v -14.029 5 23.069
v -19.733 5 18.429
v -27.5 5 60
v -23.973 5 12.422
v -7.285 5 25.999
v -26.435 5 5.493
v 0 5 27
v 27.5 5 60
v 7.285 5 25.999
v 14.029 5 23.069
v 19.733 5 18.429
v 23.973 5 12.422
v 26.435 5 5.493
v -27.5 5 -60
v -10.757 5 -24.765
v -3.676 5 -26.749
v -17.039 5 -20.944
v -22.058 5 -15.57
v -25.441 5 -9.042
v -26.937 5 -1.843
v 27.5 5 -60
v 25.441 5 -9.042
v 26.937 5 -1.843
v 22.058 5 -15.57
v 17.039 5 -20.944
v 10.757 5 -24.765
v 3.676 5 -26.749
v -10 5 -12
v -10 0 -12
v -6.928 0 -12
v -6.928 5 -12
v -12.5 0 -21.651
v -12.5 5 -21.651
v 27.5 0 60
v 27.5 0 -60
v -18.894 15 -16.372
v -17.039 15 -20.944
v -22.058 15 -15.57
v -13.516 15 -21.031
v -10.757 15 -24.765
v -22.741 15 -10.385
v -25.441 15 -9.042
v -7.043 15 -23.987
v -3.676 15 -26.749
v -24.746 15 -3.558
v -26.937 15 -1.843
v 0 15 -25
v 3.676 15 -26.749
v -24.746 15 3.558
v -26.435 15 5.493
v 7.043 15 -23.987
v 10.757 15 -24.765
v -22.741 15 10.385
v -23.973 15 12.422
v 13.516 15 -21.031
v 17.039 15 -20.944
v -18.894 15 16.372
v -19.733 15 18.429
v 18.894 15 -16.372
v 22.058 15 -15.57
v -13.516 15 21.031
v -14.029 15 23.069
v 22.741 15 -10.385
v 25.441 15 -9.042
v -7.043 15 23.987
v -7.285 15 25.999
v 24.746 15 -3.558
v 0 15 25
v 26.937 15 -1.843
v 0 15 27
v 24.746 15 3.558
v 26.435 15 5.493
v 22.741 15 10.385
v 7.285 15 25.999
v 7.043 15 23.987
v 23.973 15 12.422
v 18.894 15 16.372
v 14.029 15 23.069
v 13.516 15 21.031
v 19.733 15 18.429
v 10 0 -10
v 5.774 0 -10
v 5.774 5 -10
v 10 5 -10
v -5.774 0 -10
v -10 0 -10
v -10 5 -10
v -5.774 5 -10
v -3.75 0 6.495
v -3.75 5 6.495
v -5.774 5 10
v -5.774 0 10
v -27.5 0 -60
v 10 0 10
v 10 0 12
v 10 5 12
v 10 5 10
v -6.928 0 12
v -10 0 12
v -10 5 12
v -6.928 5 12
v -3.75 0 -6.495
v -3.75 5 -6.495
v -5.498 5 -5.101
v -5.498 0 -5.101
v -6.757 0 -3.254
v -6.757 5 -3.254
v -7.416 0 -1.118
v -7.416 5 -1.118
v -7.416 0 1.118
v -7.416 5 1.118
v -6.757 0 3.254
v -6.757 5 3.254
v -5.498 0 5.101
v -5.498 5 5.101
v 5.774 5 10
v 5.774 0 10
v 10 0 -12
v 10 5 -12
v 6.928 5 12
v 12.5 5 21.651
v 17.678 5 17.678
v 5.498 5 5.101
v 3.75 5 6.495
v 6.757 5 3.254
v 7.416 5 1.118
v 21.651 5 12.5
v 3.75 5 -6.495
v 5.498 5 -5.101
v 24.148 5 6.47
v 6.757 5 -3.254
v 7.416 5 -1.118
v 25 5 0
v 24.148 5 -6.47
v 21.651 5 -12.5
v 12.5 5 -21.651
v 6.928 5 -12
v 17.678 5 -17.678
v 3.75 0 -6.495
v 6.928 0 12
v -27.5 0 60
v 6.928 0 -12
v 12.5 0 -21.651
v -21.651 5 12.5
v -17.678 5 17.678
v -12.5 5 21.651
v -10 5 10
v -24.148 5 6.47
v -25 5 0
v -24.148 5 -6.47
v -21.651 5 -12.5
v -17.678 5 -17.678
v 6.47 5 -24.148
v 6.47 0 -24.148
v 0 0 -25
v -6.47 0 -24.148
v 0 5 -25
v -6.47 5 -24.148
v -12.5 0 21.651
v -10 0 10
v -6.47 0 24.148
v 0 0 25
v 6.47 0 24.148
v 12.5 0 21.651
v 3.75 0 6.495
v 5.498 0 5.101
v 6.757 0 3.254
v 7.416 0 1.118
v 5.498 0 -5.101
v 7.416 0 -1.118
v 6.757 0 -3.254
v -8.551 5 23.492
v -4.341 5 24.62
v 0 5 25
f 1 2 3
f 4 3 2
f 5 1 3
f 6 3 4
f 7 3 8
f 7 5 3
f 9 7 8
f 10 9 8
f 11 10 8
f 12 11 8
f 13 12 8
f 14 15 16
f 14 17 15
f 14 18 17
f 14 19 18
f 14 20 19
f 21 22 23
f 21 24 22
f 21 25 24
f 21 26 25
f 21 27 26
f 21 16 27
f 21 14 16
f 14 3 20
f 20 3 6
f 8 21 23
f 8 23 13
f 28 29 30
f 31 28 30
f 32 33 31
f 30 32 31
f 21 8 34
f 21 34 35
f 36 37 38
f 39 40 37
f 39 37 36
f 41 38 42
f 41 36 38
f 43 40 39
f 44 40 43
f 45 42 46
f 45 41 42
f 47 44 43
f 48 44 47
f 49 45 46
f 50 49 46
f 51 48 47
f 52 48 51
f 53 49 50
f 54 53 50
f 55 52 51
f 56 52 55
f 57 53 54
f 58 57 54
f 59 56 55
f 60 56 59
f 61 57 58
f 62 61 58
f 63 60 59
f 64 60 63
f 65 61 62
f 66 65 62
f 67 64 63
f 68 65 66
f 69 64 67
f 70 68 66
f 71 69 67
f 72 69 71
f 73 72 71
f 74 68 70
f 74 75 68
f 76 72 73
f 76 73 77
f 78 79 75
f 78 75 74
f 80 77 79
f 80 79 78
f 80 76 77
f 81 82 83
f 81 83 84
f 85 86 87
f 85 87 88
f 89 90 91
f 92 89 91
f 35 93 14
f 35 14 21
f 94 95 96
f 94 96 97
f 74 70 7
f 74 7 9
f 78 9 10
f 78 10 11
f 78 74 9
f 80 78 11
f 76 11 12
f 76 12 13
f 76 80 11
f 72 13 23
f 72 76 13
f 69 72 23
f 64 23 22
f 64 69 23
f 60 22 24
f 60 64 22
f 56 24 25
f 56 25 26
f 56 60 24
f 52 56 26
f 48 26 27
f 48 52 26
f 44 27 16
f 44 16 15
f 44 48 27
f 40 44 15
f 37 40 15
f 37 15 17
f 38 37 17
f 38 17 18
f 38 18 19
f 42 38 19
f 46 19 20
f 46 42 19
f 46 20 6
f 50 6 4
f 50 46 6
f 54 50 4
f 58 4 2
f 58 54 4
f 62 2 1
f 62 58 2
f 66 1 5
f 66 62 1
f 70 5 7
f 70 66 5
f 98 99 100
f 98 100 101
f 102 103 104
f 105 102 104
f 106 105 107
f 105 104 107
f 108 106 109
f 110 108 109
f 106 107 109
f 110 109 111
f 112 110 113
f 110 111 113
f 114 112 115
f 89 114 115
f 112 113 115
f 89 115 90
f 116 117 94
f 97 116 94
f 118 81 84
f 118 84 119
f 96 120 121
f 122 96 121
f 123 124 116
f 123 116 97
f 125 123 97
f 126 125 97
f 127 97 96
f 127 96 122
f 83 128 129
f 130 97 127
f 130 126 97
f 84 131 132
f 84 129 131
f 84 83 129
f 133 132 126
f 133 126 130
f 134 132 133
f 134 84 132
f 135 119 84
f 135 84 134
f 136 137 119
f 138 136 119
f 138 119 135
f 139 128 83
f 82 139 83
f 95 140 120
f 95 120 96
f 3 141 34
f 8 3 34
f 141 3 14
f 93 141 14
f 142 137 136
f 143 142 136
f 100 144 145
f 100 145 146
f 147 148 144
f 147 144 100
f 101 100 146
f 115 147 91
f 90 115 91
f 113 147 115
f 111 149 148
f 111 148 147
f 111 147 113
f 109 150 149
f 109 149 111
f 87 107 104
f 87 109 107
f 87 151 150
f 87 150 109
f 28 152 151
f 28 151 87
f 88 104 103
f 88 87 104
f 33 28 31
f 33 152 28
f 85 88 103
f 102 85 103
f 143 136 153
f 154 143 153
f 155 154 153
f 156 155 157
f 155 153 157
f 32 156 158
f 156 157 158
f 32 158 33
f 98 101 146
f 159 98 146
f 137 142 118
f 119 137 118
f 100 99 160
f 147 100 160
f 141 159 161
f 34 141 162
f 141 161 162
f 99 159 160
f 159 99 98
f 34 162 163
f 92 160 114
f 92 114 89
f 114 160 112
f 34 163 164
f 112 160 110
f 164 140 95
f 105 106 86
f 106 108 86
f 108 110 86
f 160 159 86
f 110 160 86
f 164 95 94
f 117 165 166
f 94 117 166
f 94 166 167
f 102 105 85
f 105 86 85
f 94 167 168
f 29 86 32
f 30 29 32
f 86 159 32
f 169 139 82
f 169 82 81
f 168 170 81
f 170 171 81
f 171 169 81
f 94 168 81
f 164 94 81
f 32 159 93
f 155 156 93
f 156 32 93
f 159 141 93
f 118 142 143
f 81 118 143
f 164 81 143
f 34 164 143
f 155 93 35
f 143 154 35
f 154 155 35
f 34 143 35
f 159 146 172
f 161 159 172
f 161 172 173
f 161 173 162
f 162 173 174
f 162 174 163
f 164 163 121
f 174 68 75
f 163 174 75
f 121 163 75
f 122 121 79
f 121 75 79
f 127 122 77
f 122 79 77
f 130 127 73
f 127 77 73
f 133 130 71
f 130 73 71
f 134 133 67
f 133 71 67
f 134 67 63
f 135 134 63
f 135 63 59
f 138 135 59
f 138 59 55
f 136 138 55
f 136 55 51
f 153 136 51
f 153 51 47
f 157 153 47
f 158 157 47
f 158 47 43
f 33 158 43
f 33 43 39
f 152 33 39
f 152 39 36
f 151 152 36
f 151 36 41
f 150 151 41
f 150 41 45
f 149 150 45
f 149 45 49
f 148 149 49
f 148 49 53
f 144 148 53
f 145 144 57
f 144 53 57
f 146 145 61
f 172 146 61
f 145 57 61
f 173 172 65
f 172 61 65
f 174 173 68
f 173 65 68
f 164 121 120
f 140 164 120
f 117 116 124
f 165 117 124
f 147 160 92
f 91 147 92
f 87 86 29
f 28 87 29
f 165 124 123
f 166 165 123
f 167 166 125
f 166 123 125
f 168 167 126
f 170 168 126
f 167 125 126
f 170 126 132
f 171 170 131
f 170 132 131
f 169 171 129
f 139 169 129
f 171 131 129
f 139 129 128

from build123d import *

# Parameters (mm, degrees)
SKETCH1_W           = 102
SKETCH1_H           = 120
SKETCH1_W_2         = 20
SKETCH1_H_2         = 2
BOSS_EXTRUDE1_DEPTH = 5
CUT_EXTRUDE12_DEPTH = 10
BOSS_EXTRUDE3_START = 10
SKETCH5_R           = 27
SKETCH5_R_2         = 25
BOSS_EXTRUDE3_DEPTH = 10
SKETCH6_W           = 23.5
SKETCH6_H           = 120
CUT_EXTRUDE15_DEPTH = 10


with BuildPart() as part:
    # Sketch1 → Boss-Extrude1 (new body)
    with BuildSketch(Plane(origin=(0, 0, 0), x_dir=(1, 0, 0), z_dir=(0, 1, 0))):
        Rectangle(SKETCH1_W, SKETCH1_H)
        with Locations((0, -11)):
            Rectangle(SKETCH1_W_2, SKETCH1_H_2, mode=Mode.SUBTRACT)
        with Locations((0, 11)):
            Rectangle(SKETCH1_W_2, SKETCH1_H_2, mode=Mode.SUBTRACT)
    extrude(amount=BOSS_EXTRUDE1_DEPTH)

    # Sketch2 → Cut-Extrude12 (cut)
    with BuildSketch(Plane(origin=(0, 5, 0), x_dir=(1, 0, 0), z_dir=(0, 1, 0))):
        with BuildLine():
            Line((3.75, 6.495190528), (12.5, 21.650635095))
            ThreePointArc((12.5, 21.650635095), (0, 25), (-12.5, 21.650635095))
            Line((-12.5, 21.650635095), (-3.75, 6.495190528))
            ThreePointArc((-3.75, 6.495190528), (-7.5, 0), (-3.75, -6.495190528))
            Line((-3.75, -6.495190528), (-12.5, -21.650635095))
            ThreePointArc((-12.5, -21.650635095), (0, -25), (12.5, -21.650635095))
            Line((12.5, -21.650635095), (3.75, -6.495190528))
            ThreePointArc((3.75, -6.495190528), (7.5, 0), (3.75, 6.495190528))
        make_face()
    extrude(amount=-CUT_EXTRUDE12_DEPTH, mode=Mode.SUBTRACT)

    # Sketch5 → Boss-Extrude3 (add)
    with BuildSketch(Plane(origin=(0, 5, 0), x_dir=(1, 0, 0), z_dir=(0, 1, 0)).offset(BOSS_EXTRUDE3_START)):
        with Locations(Location((0, 0, 0), (0, 0, 270))):
            Circle(SKETCH5_R)
        with Locations(Location((0, 0, 0), (0, 0, 270))):
            Circle(SKETCH5_R_2, mode=Mode.SUBTRACT)
    extrude(amount=-BOSS_EXTRUDE3_DEPTH)

    # Sketch6 → Cut-Extrude15 (cut)
    with BuildSketch(Plane(origin=(0, 5, 0), x_dir=(1, 0, 0), z_dir=(0, 1, 0))):
        with Locations((-39.25, 0)):
            Rectangle(SKETCH6_W, SKETCH6_H)
        with Locations((39.25, 0)):
            Rectangle(SKETCH6_W, SKETCH6_H)
    extrude(amount=-CUT_EXTRUDE15_DEPTH, mode=Mode.SUBTRACT)


solid = part.part
